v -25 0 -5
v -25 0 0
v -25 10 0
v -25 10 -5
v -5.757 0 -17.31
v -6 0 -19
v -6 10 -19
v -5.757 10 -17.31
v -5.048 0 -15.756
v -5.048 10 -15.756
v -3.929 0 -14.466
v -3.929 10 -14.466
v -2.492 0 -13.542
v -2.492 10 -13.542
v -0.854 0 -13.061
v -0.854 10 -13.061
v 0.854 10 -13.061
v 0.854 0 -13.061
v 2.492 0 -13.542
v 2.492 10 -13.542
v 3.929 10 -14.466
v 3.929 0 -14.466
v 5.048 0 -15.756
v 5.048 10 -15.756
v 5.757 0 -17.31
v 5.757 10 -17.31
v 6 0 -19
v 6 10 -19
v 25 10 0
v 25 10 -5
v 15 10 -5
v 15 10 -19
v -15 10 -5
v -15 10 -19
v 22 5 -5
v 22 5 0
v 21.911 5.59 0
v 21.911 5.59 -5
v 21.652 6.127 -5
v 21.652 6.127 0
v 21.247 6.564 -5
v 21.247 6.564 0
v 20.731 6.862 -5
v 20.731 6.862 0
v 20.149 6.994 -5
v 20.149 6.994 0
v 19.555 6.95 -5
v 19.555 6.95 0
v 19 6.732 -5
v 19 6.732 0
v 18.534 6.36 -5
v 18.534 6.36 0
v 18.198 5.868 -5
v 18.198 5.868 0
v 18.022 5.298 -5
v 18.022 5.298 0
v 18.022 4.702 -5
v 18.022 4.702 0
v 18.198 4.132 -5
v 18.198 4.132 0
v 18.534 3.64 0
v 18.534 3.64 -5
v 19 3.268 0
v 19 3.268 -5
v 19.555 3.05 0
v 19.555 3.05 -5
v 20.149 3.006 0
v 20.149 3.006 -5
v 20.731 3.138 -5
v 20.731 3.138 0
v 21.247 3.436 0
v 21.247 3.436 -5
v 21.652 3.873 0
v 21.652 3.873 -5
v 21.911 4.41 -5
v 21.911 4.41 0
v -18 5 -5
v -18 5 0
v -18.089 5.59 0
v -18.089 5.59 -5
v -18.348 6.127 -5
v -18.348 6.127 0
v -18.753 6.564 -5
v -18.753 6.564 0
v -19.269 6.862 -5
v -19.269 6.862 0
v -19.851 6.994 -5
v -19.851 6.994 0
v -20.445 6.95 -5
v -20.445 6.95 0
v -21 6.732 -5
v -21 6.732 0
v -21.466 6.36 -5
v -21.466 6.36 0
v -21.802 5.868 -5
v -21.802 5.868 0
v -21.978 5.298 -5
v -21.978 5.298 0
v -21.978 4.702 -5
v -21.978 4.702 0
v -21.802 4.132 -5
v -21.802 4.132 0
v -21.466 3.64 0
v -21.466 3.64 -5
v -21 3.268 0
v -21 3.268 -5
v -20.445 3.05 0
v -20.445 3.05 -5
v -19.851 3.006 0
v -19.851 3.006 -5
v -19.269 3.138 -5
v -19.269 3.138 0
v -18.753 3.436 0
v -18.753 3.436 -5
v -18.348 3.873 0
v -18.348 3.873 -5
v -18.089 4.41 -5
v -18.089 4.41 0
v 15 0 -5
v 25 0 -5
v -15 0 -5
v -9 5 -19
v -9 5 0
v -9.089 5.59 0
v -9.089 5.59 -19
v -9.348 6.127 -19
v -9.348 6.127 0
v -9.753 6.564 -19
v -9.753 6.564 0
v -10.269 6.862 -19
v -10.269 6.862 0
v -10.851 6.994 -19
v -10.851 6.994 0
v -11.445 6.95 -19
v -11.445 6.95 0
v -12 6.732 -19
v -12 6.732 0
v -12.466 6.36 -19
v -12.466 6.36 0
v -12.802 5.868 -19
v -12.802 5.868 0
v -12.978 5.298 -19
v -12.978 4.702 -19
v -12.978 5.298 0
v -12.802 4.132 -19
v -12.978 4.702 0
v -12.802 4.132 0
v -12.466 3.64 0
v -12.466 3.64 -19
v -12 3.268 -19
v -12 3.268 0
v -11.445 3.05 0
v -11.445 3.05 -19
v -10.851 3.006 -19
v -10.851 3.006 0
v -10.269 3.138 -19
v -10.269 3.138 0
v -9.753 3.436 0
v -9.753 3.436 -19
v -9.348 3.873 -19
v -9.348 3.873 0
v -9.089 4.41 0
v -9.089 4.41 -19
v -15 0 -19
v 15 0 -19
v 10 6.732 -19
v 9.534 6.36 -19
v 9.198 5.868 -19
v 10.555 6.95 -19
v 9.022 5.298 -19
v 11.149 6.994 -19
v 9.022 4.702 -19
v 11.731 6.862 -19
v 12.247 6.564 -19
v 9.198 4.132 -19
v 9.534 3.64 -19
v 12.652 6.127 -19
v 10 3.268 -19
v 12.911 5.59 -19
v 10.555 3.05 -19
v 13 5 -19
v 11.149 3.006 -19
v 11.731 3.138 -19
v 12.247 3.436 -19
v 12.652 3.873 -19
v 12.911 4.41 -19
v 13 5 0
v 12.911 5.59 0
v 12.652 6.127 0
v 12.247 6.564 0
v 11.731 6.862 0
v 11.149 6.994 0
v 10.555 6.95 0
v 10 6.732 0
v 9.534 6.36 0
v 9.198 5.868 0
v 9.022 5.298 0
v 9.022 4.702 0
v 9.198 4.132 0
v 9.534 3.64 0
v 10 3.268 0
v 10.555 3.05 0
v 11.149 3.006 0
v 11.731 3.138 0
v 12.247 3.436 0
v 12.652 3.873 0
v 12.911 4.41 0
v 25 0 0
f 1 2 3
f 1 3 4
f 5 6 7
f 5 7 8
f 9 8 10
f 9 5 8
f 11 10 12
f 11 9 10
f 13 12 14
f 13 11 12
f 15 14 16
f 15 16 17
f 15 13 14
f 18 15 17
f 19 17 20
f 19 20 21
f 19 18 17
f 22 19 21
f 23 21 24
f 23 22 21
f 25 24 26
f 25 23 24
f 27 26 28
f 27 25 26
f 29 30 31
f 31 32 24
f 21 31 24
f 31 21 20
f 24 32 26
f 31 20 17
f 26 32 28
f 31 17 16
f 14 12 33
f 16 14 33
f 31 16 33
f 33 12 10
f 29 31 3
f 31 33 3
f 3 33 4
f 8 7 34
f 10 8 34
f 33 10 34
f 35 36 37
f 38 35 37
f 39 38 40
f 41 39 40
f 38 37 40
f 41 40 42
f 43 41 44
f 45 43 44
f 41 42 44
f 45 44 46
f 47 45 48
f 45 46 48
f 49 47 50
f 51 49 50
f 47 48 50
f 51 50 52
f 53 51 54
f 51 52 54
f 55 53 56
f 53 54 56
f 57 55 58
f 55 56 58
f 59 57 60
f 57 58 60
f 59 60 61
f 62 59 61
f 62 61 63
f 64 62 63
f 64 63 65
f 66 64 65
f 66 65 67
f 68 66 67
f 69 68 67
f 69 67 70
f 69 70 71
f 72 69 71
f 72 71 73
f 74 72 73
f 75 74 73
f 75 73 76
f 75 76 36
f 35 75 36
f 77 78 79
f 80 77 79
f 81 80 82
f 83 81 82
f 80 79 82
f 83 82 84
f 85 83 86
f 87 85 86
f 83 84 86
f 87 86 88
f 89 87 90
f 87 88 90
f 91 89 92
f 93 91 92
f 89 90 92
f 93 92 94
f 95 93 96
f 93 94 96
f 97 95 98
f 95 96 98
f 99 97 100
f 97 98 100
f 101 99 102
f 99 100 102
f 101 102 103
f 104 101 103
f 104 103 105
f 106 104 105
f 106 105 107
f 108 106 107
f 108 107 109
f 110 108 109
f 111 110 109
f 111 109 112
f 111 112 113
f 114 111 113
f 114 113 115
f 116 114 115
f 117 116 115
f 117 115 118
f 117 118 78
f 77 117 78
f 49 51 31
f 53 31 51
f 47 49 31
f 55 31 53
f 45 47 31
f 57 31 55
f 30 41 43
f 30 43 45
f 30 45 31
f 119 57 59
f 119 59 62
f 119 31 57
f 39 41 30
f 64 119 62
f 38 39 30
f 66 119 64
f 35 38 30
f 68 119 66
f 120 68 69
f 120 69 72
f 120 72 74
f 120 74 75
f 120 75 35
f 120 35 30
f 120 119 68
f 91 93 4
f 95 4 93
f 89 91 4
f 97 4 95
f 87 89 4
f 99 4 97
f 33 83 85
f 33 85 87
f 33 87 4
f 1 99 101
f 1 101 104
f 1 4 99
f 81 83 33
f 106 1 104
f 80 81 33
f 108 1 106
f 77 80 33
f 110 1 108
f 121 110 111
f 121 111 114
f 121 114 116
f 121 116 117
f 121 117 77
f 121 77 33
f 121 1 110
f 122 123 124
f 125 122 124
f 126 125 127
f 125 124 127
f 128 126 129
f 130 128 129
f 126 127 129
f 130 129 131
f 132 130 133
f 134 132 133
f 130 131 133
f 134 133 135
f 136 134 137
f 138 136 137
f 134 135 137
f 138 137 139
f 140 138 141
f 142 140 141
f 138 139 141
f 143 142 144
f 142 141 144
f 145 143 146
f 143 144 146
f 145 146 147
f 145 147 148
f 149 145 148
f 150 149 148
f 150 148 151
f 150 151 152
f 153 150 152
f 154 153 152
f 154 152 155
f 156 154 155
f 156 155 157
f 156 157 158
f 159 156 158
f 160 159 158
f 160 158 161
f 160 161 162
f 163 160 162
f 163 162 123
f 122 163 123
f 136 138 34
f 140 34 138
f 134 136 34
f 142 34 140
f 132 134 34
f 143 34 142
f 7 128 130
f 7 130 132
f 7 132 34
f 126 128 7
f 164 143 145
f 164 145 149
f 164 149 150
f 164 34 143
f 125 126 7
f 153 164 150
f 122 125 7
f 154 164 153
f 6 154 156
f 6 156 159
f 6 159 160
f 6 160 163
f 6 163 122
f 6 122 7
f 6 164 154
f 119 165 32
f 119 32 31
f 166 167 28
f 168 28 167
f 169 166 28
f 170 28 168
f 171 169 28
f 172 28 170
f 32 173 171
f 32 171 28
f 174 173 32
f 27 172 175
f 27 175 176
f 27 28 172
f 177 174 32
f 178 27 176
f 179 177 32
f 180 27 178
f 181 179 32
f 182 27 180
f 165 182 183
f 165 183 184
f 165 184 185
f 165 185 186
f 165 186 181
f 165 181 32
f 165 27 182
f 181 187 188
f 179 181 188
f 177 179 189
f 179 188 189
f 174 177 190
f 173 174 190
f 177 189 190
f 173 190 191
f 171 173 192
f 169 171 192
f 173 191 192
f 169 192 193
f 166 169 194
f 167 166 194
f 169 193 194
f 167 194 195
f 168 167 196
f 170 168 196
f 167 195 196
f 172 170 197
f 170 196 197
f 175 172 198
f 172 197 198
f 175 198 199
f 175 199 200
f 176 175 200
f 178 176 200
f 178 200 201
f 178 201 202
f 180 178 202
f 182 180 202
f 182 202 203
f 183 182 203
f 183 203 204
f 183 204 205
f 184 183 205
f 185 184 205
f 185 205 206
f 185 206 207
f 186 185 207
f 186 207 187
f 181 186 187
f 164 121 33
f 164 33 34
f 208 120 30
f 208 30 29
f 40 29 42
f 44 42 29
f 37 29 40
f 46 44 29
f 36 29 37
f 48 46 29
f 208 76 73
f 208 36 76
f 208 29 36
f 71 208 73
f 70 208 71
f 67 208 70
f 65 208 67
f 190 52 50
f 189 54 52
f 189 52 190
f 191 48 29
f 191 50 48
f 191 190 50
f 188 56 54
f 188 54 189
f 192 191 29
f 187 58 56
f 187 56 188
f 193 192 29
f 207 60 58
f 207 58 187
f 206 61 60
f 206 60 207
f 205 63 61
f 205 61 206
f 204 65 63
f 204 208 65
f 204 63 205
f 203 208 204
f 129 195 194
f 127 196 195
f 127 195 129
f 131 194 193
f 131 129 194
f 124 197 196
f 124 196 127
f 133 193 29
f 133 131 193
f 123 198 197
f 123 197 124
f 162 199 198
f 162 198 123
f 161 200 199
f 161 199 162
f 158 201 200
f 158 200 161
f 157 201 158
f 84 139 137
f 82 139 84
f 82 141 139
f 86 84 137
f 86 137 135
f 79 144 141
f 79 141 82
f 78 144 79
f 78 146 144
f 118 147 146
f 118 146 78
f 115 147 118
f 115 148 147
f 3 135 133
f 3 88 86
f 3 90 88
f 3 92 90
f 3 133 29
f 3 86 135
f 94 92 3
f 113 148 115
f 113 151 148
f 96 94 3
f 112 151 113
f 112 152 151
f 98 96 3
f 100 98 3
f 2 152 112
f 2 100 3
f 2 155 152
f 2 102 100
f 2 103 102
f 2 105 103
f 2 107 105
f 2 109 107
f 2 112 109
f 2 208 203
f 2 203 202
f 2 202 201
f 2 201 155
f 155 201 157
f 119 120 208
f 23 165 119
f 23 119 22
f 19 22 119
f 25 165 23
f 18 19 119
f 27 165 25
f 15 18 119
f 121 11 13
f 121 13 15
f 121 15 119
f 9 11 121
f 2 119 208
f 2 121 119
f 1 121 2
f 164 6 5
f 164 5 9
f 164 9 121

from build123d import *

# Parameters (mm, degrees)
BOSS_EXTRUDE1_DEPTH = 10
SKETCH2_R           = 2
CUT_EXTRUDE1_DEPTH  = 20


with BuildPart() as part:
    # Sketch1 → Boss-Extrude1 (new body)
    with BuildSketch(Plane(origin=(0, 0, 0), x_dir=(1, 0, 0), z_dir=(0, 1, 0))):
        with BuildLine():
            Line((25, 0), (-25, 0))
            Line((-25, 0), (-25, 5))
            Line((-25, 5), (-15, 5))
            Line((-15, 5), (-15, 19))
            Line((-15, 19), (-6, 19))
            ThreePointArc((-6, 19), (0, 13), (6, 19))
            Line((6, 19), (15, 19))
            Line((15, 19), (15, 5))
            Line((15, 5), (25, 5))
            Line((25, 5), (25, 0))
        make_face()
    extrude(amount=BOSS_EXTRUDE1_DEPTH)

    # Sketch2 → Cut-Extrude1 (cut, through all)
    with BuildSketch(Plane.XY):
        with Locations((-20, 5)):
            Circle(SKETCH2_R)
        with Locations((-11, 5)):
            Circle(SKETCH2_R)
        with Locations((20, 5)):
            Circle(SKETCH2_R)
        with Locations((11, 5)):
            Circle(SKETCH2_R)
    extrude(amount=-CUT_EXTRUDE1_DEPTH, mode=Mode.SUBTRACT)


solid = part.part
